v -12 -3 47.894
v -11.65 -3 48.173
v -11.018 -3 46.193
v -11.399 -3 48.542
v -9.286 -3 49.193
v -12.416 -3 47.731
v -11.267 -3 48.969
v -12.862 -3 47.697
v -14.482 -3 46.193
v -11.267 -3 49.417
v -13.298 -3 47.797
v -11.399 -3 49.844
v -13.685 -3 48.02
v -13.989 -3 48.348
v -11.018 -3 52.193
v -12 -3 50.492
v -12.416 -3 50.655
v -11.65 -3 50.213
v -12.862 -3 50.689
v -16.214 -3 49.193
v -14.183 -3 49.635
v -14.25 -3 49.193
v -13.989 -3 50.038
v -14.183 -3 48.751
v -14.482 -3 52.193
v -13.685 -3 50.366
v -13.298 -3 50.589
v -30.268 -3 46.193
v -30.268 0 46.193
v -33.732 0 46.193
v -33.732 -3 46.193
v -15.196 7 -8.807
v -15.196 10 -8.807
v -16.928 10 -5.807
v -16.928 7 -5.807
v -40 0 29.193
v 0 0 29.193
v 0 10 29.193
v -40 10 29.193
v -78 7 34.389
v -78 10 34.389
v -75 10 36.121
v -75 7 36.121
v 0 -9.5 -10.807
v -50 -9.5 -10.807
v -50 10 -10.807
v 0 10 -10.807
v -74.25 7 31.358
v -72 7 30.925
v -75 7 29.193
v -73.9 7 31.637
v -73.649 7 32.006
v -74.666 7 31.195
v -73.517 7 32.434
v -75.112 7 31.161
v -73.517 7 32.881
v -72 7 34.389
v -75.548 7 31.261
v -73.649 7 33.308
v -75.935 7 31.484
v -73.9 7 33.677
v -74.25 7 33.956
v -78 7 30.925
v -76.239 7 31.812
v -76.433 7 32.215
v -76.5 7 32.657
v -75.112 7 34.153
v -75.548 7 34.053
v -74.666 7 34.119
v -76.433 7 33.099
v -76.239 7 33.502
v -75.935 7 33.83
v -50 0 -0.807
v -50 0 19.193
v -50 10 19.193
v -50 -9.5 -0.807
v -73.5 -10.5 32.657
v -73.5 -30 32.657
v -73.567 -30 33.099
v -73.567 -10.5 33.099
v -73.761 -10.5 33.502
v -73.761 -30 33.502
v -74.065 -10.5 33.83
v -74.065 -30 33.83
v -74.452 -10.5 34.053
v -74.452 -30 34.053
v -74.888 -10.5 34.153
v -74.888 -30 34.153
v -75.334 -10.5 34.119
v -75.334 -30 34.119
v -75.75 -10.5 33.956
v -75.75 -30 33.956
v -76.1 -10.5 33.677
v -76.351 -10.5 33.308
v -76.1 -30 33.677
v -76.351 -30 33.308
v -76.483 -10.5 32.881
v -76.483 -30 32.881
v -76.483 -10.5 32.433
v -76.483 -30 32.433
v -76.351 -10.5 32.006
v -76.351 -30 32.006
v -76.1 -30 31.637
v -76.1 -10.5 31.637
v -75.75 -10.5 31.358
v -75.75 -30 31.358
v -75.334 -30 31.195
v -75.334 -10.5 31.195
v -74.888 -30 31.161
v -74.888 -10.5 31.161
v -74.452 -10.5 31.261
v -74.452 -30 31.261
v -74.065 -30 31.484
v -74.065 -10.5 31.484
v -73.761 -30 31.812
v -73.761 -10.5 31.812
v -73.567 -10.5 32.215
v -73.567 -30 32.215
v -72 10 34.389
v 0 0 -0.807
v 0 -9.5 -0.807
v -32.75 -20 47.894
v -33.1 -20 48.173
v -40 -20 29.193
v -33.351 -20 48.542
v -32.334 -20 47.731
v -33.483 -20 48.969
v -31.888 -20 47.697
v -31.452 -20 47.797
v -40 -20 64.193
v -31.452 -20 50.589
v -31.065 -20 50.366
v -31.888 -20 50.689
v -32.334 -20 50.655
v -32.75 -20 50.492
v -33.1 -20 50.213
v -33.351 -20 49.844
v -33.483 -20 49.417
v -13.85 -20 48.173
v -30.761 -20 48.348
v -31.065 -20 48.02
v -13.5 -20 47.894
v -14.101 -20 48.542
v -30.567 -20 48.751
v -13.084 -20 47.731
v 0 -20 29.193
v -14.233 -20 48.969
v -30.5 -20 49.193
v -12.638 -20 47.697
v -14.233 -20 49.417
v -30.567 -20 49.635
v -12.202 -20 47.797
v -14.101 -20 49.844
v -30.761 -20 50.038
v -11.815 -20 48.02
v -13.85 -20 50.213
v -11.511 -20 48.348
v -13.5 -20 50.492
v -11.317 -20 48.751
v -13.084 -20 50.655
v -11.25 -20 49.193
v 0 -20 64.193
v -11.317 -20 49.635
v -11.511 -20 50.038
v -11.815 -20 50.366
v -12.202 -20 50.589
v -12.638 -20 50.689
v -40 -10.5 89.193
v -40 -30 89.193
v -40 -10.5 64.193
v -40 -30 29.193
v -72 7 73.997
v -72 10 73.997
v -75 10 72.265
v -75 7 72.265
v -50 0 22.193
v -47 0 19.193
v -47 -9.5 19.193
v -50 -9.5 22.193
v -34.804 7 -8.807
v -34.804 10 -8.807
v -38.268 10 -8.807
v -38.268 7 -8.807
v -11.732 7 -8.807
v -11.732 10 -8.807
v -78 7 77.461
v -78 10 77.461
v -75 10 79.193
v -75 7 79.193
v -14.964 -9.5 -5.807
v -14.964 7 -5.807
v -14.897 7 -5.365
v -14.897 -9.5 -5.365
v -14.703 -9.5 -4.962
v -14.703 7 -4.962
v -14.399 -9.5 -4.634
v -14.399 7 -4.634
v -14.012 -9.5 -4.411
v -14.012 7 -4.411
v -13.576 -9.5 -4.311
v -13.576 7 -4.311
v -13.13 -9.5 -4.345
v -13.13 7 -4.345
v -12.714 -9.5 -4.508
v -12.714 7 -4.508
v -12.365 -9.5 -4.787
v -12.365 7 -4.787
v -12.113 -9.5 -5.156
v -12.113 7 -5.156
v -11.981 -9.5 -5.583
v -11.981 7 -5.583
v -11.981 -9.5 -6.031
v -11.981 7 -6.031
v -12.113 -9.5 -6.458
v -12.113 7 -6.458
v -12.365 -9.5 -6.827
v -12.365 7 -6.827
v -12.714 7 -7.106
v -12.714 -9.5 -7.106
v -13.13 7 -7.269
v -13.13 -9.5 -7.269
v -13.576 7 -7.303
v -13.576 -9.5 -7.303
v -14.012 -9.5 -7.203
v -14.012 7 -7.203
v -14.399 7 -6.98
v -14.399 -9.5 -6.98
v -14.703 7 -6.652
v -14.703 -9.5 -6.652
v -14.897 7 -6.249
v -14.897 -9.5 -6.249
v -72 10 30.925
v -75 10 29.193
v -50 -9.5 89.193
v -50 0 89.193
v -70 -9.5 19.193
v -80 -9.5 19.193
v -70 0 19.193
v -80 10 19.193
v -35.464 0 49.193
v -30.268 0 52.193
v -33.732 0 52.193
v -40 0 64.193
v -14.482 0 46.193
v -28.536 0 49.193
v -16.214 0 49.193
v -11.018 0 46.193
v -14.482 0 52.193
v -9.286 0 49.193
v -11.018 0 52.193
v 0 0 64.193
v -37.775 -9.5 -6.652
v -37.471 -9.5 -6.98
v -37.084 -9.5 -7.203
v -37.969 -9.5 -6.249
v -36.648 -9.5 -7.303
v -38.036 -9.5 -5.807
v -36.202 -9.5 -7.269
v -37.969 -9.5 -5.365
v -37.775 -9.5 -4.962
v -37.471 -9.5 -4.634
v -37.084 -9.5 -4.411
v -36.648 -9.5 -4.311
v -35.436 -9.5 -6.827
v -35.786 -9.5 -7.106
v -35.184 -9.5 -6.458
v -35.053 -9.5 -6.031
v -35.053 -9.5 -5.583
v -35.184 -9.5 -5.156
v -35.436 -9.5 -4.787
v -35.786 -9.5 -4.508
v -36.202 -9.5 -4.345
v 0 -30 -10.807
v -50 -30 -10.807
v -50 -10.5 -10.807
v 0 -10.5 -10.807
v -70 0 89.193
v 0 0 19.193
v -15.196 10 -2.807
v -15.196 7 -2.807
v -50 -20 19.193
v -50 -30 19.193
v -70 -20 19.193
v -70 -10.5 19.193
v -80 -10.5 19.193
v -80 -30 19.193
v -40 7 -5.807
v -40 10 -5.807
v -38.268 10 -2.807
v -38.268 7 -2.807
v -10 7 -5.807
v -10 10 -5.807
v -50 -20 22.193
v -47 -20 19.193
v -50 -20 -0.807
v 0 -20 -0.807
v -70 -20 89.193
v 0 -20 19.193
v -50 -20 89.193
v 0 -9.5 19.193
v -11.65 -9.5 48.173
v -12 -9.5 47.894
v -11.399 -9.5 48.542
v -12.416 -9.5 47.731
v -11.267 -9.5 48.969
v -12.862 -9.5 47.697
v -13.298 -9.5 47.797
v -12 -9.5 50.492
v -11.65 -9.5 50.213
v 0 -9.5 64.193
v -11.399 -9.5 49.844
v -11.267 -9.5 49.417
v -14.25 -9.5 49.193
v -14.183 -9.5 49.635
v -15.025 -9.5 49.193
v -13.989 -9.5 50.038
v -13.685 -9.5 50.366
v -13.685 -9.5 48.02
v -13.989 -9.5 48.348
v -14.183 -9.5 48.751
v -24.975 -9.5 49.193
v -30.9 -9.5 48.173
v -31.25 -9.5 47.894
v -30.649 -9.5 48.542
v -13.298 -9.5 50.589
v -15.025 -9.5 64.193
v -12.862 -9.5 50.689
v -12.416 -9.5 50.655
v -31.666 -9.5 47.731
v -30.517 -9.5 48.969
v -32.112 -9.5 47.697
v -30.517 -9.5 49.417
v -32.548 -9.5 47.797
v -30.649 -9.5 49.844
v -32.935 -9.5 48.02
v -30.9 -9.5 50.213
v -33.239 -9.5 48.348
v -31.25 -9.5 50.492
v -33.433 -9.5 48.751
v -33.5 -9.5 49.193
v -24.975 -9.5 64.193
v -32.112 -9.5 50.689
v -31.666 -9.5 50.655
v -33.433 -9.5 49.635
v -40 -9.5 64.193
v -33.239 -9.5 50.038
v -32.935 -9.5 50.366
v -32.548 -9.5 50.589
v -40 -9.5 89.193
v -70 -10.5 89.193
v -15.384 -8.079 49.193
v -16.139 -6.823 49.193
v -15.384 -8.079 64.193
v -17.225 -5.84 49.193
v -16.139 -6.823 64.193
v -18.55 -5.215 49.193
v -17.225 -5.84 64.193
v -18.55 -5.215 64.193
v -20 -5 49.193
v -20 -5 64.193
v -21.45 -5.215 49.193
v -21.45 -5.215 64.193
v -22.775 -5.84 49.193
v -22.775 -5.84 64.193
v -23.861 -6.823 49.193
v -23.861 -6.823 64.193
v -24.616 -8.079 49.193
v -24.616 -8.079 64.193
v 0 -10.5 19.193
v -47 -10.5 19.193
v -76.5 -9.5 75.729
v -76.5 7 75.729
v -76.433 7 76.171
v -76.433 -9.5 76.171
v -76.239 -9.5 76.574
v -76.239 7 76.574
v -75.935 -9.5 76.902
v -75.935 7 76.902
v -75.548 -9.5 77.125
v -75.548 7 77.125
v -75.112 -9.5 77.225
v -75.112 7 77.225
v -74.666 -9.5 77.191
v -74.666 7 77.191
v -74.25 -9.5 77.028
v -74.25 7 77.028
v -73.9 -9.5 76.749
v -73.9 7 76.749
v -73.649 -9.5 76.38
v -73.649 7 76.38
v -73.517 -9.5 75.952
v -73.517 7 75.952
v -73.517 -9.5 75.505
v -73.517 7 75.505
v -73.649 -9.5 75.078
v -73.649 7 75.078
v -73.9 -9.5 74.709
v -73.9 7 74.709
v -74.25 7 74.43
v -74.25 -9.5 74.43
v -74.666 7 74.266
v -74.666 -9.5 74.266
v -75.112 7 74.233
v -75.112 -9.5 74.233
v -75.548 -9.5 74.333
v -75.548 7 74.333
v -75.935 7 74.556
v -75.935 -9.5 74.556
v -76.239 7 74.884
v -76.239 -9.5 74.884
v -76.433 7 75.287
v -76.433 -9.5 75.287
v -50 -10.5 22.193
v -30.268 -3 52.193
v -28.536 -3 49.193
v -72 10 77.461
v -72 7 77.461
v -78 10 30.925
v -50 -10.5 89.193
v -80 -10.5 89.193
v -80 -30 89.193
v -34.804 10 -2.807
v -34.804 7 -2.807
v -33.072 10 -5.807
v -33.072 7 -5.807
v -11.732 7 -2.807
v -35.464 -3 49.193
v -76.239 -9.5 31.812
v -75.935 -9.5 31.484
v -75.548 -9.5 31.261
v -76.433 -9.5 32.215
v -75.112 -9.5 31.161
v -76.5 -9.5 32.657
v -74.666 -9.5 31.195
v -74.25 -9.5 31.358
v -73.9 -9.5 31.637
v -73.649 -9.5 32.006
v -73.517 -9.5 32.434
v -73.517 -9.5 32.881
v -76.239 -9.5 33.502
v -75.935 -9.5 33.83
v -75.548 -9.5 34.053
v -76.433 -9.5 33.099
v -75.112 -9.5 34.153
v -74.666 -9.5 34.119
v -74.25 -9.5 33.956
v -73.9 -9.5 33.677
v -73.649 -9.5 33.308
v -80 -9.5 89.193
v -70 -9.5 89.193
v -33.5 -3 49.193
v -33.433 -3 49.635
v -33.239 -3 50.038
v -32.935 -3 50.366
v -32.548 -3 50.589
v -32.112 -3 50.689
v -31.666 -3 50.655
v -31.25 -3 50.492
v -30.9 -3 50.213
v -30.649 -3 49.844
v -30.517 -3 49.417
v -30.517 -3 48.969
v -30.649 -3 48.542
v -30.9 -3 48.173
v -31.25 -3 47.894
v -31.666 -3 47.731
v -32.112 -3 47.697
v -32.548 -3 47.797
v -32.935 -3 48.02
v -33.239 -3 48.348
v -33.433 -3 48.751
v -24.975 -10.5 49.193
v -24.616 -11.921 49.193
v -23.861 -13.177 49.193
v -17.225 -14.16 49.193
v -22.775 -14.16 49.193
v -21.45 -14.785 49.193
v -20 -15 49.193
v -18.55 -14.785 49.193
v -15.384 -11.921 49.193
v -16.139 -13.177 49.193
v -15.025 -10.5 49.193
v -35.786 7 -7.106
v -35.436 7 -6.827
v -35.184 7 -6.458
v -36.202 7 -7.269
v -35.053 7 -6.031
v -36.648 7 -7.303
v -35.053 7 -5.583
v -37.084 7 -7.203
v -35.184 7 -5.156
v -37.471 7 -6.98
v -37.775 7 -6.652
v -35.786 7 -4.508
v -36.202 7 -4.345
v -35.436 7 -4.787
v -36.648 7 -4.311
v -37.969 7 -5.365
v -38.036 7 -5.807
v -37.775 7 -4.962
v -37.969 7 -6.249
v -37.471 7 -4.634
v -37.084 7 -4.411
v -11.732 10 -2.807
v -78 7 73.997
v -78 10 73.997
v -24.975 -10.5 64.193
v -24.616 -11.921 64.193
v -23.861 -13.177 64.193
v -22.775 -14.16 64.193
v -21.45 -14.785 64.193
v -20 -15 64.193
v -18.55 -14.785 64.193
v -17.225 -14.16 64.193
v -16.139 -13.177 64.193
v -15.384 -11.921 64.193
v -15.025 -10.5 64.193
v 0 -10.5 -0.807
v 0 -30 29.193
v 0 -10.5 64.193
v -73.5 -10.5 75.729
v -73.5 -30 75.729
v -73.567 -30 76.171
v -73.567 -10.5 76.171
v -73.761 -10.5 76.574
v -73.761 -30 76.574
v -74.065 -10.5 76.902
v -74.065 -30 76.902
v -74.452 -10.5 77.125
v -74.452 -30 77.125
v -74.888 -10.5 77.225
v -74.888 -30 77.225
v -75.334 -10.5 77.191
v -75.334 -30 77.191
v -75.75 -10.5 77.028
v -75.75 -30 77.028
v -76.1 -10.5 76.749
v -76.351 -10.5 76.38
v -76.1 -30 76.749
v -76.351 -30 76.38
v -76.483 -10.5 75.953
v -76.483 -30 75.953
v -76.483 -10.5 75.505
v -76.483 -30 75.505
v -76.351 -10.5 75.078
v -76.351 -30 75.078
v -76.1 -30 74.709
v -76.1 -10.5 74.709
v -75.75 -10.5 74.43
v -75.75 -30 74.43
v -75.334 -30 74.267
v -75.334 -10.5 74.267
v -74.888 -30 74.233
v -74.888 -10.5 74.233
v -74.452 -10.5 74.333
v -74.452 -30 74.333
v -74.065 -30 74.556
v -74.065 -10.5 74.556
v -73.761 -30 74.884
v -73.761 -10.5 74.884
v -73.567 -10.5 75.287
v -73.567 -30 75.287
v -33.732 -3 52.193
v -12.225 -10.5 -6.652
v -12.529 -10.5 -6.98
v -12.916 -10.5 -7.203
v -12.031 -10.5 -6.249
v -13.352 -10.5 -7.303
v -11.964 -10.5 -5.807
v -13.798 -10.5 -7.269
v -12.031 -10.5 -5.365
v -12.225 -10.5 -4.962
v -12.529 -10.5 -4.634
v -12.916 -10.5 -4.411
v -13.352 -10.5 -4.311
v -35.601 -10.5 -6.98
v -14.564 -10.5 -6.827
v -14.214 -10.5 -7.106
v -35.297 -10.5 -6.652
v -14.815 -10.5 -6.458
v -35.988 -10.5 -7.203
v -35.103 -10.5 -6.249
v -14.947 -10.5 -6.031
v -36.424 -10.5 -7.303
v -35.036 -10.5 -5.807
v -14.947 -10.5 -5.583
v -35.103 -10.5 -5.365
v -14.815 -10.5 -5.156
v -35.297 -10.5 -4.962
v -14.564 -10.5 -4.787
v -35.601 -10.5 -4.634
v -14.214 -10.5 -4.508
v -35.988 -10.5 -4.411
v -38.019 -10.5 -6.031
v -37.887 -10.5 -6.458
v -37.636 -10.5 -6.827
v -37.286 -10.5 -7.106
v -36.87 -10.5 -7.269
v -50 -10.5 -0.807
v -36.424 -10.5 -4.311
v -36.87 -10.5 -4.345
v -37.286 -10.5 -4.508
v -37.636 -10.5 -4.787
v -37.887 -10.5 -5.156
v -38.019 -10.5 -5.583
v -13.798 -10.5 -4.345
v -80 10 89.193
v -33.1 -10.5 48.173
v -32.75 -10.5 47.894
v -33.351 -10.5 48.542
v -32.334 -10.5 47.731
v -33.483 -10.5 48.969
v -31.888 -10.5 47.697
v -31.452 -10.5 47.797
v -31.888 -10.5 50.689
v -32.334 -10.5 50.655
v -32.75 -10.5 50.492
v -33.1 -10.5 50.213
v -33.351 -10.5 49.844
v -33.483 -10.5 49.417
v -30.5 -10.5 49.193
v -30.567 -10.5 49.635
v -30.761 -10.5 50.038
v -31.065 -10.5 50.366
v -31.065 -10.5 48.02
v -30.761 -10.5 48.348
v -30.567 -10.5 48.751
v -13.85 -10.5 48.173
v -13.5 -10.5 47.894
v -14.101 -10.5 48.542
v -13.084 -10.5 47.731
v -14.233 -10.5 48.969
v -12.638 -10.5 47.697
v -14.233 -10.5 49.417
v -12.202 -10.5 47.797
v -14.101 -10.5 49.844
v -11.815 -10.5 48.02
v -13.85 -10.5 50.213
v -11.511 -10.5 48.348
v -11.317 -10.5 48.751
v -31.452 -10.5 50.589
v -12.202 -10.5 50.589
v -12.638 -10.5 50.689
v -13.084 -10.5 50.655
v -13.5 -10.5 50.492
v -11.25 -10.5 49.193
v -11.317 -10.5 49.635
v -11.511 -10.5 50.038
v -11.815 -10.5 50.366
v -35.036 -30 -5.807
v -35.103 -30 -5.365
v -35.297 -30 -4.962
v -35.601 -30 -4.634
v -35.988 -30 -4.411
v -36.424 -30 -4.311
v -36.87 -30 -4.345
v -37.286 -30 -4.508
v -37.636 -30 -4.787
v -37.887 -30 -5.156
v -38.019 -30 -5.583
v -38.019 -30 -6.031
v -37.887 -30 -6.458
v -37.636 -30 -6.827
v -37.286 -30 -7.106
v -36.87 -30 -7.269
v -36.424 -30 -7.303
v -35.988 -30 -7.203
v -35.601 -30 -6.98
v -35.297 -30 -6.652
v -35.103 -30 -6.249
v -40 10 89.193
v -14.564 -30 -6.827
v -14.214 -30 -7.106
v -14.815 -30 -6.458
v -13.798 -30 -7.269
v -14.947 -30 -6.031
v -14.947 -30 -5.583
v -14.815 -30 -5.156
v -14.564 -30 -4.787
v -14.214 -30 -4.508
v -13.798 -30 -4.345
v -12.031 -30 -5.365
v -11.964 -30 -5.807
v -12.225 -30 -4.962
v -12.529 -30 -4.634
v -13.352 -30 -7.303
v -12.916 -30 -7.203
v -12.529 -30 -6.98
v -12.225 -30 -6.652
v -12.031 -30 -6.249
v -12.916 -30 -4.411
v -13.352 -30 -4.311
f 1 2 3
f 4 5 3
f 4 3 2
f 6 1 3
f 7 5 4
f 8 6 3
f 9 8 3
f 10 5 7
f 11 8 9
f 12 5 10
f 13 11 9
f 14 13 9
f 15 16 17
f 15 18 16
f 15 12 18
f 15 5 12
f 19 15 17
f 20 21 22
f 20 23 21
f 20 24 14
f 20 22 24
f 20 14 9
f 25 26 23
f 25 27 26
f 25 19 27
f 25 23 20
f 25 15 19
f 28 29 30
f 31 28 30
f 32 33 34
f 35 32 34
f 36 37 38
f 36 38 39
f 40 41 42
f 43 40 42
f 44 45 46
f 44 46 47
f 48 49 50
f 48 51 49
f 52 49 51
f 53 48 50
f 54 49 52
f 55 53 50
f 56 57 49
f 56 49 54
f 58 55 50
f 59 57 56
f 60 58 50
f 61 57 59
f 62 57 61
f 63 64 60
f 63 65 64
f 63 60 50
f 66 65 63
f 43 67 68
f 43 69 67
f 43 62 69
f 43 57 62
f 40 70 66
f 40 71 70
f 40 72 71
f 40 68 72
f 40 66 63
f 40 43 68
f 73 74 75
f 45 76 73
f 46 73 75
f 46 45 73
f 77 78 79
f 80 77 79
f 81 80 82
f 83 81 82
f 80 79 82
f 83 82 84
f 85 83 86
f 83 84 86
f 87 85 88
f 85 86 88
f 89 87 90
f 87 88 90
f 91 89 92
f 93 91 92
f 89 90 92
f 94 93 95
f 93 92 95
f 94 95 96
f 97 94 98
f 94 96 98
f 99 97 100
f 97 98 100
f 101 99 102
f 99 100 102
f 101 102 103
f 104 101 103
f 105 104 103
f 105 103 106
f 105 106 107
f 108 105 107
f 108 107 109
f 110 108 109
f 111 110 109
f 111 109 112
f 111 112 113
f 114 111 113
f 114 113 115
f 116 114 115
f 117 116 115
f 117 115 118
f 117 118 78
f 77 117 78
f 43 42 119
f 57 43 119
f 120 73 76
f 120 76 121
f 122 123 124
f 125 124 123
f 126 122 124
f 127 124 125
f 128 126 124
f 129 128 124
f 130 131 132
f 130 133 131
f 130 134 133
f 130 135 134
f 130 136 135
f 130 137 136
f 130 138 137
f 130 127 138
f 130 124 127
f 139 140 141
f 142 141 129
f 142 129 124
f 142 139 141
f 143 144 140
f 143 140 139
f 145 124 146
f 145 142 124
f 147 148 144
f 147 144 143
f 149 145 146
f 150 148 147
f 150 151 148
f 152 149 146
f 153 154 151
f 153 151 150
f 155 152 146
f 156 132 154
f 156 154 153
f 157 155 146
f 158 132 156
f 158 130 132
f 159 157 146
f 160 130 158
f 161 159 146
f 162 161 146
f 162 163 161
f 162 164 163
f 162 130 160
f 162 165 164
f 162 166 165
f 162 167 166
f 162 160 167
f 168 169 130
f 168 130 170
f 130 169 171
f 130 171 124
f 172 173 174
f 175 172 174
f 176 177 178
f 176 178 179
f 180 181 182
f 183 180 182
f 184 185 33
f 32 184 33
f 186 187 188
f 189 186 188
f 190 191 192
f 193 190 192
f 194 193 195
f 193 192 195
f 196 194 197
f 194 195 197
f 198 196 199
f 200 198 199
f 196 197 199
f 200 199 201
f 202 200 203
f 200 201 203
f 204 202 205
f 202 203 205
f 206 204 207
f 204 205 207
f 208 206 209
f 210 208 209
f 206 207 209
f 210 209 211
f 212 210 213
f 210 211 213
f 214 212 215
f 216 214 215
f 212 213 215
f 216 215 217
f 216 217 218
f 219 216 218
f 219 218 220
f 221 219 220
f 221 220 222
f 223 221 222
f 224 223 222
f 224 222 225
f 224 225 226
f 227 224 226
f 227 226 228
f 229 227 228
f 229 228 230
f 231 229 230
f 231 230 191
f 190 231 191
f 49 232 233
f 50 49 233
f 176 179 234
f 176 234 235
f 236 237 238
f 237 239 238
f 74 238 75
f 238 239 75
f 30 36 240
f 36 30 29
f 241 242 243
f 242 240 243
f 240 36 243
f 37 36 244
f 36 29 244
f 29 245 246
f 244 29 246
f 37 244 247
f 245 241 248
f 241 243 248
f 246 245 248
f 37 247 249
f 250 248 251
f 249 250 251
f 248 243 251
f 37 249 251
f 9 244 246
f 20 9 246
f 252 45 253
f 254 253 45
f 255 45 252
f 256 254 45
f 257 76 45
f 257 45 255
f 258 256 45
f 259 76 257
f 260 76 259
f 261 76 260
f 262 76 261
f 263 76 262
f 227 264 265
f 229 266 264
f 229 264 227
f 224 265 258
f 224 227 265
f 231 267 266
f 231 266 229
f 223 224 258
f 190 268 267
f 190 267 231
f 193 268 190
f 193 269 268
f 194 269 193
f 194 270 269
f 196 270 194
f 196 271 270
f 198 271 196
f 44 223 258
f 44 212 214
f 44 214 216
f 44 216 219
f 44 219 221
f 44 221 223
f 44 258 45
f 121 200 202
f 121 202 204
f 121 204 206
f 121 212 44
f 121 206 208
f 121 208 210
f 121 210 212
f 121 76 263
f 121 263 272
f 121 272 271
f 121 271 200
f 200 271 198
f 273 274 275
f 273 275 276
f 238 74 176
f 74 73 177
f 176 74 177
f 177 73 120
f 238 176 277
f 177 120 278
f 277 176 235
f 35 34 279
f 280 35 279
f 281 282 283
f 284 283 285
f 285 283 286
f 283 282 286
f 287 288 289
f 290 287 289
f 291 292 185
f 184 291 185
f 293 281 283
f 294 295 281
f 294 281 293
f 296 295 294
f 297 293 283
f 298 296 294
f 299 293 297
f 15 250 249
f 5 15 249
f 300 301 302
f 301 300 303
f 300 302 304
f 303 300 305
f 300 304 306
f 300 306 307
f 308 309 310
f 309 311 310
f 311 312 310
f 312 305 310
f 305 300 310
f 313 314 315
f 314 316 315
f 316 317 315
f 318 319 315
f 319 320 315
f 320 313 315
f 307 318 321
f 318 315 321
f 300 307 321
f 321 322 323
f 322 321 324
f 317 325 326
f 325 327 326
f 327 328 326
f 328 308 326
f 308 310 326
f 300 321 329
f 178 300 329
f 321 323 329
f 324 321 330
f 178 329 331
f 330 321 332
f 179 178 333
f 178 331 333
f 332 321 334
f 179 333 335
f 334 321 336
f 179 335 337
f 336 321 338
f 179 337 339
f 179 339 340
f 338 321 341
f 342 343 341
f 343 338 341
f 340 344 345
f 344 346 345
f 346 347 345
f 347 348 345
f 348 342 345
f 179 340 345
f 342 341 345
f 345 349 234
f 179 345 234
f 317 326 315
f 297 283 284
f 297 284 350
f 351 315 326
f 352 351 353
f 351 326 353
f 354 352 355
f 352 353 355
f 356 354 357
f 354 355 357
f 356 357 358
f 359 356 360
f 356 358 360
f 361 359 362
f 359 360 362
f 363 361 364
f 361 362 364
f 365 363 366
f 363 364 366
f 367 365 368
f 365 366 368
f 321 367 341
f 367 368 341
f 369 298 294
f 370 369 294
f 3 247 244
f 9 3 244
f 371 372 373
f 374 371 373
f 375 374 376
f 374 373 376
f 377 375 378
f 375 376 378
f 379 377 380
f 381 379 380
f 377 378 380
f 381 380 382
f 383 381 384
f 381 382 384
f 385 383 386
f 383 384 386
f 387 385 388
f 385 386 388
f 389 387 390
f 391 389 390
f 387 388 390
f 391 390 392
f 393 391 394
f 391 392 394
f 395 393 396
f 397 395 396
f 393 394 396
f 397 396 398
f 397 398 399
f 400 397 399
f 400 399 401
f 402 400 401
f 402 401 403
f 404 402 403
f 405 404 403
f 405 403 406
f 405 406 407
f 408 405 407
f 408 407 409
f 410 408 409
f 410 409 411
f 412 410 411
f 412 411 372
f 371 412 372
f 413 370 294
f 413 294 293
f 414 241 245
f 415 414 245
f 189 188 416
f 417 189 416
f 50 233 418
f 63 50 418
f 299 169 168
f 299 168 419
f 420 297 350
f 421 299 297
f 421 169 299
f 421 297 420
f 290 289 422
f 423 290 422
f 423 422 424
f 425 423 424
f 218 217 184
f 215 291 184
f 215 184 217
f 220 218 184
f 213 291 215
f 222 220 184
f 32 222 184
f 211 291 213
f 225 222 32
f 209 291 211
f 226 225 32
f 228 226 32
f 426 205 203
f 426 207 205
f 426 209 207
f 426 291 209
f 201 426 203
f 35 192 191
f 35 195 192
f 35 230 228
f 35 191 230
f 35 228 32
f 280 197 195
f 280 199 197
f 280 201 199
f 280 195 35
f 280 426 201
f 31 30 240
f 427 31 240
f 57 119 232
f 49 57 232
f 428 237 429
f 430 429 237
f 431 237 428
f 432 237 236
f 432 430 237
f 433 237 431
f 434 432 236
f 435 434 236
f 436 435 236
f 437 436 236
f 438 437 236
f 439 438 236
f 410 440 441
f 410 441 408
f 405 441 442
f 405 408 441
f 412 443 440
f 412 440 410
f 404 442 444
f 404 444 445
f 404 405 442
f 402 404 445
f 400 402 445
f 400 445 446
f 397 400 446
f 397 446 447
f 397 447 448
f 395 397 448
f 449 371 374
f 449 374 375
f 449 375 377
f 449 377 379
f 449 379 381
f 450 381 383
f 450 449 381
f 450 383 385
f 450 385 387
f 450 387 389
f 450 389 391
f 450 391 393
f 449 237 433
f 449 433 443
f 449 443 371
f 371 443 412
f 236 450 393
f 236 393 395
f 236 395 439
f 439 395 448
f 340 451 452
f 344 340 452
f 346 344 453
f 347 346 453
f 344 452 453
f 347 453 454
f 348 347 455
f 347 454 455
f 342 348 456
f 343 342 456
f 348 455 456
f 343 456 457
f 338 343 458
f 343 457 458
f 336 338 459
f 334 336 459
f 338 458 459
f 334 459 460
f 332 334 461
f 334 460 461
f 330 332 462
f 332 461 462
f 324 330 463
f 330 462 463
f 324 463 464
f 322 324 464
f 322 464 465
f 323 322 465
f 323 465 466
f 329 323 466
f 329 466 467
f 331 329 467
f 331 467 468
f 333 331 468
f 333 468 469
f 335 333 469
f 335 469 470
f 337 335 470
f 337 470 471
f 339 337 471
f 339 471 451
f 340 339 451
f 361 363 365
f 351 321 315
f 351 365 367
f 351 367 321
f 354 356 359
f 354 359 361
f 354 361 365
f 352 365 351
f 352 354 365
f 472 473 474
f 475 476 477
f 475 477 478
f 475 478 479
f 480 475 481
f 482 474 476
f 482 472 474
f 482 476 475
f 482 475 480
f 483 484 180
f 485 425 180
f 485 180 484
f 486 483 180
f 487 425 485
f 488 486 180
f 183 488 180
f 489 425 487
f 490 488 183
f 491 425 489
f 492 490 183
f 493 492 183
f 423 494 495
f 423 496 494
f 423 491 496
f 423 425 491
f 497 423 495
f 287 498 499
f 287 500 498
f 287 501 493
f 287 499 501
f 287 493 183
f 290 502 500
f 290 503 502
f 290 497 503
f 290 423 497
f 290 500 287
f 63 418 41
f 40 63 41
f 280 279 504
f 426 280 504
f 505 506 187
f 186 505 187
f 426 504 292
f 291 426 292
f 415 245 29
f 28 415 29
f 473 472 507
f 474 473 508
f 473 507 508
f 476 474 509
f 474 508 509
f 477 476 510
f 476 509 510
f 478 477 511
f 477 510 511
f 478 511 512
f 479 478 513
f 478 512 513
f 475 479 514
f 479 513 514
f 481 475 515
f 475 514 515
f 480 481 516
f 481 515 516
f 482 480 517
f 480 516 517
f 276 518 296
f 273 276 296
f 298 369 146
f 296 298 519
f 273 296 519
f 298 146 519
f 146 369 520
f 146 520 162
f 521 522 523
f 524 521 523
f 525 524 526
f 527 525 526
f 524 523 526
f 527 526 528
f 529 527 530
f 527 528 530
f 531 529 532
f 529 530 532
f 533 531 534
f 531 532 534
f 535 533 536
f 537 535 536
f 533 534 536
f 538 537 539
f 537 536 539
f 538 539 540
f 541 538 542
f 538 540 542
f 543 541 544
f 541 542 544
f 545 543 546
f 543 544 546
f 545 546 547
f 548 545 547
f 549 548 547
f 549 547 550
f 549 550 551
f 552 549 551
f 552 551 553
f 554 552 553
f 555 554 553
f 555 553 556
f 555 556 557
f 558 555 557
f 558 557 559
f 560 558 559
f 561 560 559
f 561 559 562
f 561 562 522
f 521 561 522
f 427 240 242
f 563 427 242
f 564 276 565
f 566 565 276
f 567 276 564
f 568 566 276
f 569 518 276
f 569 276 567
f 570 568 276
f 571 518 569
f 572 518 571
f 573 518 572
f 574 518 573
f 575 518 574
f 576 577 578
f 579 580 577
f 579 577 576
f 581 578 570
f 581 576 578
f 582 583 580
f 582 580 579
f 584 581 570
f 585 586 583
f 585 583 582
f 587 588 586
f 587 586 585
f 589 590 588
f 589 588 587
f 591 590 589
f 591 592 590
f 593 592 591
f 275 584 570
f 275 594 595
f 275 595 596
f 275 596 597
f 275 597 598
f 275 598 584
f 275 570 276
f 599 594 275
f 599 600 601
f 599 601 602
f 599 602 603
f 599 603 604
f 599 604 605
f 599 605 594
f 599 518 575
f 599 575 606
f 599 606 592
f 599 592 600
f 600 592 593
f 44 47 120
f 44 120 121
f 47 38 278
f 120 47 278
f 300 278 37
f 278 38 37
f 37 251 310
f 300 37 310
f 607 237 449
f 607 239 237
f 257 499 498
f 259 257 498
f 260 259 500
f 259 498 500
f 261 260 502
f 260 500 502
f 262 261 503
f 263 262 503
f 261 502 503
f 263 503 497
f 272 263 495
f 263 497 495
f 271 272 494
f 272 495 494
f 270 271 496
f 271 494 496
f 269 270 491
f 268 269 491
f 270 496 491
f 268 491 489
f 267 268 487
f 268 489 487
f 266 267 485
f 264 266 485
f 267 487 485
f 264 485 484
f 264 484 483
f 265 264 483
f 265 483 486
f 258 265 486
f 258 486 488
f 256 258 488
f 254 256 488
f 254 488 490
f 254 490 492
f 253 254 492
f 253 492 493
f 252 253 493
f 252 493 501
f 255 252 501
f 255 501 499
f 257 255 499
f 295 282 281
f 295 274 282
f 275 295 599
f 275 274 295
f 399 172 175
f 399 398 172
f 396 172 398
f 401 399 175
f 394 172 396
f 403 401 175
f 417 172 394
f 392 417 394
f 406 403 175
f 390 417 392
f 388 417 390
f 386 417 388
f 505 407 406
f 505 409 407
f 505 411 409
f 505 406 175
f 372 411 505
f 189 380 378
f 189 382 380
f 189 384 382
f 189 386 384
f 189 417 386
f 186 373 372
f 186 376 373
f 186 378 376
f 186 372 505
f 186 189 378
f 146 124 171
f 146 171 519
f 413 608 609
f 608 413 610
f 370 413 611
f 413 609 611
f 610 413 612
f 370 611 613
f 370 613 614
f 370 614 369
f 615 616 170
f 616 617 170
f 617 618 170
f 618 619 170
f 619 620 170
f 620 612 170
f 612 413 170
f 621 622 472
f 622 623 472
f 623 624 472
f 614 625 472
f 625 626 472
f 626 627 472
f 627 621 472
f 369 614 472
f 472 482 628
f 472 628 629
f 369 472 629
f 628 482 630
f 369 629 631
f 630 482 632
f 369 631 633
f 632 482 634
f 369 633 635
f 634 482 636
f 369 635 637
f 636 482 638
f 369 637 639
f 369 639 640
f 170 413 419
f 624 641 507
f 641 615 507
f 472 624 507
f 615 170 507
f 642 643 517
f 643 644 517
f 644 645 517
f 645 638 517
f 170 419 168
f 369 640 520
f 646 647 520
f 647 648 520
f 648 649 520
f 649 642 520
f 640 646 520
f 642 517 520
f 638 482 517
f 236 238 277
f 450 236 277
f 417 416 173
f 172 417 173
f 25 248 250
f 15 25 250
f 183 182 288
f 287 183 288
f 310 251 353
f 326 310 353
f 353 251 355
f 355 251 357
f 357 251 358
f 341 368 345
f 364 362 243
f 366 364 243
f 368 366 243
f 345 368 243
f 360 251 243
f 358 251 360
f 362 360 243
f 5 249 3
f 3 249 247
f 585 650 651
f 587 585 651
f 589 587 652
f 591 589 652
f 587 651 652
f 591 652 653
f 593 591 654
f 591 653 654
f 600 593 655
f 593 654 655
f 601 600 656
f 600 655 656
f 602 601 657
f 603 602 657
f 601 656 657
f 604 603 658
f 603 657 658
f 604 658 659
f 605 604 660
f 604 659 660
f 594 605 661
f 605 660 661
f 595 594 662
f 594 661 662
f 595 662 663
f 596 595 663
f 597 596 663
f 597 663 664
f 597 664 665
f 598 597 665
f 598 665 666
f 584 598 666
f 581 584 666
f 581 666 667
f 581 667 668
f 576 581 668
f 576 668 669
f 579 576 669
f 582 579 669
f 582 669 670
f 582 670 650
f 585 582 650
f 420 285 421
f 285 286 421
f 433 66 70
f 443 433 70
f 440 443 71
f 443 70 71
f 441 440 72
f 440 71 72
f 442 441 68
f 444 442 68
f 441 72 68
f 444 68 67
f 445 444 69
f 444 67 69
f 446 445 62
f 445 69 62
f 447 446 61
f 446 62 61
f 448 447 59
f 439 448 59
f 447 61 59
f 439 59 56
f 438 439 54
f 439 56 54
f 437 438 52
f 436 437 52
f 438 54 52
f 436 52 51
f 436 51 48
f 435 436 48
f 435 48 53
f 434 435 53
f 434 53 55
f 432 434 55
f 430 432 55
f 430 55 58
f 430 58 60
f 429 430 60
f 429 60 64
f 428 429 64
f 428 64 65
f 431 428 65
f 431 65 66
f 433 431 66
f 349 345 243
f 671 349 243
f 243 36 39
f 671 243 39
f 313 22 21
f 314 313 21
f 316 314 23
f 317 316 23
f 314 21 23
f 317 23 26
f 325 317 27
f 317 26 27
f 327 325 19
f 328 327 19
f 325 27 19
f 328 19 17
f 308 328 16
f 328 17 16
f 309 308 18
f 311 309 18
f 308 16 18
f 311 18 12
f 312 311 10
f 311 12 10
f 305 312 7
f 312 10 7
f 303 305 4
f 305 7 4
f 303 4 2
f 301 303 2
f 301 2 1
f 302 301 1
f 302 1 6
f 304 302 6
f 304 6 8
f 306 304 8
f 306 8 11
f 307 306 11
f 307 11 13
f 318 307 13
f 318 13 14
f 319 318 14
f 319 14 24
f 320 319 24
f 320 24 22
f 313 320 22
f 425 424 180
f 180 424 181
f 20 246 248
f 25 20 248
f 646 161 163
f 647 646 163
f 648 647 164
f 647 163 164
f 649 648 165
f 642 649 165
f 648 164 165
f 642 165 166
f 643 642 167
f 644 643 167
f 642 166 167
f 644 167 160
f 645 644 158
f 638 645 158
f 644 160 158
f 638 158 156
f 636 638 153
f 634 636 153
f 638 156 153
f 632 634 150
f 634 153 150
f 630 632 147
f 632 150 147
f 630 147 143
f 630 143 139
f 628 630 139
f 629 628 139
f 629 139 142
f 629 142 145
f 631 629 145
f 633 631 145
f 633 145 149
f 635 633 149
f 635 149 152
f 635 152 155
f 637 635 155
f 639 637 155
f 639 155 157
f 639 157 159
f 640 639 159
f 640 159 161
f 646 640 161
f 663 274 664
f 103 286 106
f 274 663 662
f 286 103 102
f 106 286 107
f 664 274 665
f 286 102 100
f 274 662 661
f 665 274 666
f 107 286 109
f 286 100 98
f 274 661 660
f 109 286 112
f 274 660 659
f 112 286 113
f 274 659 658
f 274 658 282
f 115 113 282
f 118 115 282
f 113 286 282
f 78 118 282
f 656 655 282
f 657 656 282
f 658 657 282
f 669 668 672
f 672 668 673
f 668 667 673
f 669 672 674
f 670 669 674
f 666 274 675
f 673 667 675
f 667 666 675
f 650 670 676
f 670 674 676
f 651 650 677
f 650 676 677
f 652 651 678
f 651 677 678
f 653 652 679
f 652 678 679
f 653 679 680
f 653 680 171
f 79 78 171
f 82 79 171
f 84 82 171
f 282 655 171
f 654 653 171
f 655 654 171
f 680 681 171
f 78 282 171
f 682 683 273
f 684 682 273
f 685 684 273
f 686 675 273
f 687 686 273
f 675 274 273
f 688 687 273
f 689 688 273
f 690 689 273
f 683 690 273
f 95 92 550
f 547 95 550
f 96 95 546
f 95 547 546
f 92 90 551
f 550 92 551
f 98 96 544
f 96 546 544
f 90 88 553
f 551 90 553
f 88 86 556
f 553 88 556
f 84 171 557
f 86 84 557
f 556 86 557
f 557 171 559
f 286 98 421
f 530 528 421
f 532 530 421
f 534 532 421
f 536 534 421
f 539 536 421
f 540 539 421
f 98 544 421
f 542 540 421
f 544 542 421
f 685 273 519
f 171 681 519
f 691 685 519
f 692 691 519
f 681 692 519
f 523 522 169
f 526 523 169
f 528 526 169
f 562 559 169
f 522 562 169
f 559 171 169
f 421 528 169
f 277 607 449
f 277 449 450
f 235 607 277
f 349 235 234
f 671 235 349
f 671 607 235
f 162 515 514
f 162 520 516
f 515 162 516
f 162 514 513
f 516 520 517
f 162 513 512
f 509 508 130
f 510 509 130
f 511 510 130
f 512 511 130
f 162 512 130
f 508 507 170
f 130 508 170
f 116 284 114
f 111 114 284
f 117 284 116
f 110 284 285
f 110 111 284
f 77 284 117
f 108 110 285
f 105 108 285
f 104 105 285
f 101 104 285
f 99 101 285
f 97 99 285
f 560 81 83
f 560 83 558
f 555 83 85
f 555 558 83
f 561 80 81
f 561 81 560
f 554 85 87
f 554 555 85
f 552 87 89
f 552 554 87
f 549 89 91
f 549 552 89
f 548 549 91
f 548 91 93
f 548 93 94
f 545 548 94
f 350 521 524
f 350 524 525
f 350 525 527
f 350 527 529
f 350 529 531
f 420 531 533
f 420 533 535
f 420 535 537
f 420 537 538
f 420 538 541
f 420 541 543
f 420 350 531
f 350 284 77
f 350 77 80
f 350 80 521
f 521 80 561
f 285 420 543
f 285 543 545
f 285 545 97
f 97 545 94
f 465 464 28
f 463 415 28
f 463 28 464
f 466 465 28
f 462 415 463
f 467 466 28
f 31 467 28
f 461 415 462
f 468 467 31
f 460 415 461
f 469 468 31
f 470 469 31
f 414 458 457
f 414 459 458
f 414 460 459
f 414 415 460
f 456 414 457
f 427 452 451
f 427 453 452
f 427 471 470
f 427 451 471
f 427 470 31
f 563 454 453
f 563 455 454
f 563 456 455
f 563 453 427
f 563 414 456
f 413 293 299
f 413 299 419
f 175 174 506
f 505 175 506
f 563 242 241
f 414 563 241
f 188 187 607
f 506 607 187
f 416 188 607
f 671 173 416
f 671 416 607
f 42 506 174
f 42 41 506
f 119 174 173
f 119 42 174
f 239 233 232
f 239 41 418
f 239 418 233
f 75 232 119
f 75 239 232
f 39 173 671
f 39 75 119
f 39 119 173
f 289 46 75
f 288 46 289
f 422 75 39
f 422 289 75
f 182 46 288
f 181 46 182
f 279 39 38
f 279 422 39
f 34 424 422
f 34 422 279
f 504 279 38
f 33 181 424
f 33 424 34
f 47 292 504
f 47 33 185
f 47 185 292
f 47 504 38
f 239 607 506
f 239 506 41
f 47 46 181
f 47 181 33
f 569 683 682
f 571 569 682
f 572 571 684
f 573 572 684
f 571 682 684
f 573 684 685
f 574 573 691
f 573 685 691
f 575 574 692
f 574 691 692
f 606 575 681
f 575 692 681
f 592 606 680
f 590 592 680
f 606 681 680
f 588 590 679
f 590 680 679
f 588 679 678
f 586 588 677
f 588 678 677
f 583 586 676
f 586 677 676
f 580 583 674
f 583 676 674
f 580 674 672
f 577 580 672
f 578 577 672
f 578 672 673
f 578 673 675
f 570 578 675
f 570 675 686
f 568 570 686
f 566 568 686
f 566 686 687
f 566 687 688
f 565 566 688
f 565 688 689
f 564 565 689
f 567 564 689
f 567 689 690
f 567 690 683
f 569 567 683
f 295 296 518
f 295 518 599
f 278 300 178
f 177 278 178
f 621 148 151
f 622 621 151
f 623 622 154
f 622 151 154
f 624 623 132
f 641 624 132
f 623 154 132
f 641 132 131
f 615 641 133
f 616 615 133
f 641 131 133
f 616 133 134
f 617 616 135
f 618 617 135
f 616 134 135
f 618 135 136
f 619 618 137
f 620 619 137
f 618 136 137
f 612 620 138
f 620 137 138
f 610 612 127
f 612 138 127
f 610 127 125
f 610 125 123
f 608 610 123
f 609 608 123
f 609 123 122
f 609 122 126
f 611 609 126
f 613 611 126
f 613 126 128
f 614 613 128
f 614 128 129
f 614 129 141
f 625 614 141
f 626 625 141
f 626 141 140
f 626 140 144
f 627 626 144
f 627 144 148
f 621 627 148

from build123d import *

# Parameters (mm, degrees)
F1_DEPTH        = 20
F2_W            = 50
F2_H            = 10
F3_DEPTH        = 10
F4_W            = 50
F4_H            = 10
F5_DEPTH        = 10
F6_W            = 50
F6_H            = 10
F7_DEPTH        = 30
F8_W            = 10
F8_H            = 10
F9_DEPTH        = 60
F10_W           = 10
F10_H           = 70
F11_DEPTH       = 30
F12_R           = 5
F13_DEPTH       = 15
F16_DEPTH       = 70
F17_T1_DEPTH    = 17.2150489639
F17_S1_T1_DEPTH = 10.5
F18_W           = 10
F18_H           = 70
F18_W_2         = 50
F18_H_2         = 10
F20_DEPTH       = 9.5
F19_W           = 10
F19_H           = 70
F19_W_2         = 50
F19_H_2         = 10
F21_DEPTH       = 9.5
F22_R           = 1.5
F23_DEPTH       = 20
F24_R           = 1.5
F25_DEPTH       = 20
F26_DEPTH       = 3
F28_R           = 1.5
F29_DEPTH       = 10
F27_R           = 1.5
F30_DEPTH       = 10
F31_DEPTH       = 3


# Not quite as in the source:
# - a fillet or chamfer that OpenCascade refuses, or shapes differently, is made with other operations: its cross-section is extruded or revolved along the edge and cut away or added


with BuildPart() as f1:
    # F0 (on Front) → F1 (new body)
    with BuildSketch(Plane.XZ):
        Polygon((-40, 89.1929870069), (-50, 89.1929870069), (-50, 19.1929870069), (0, 19.1929870069), (0, 64.1929870069), (-40, 64.1929870069), align=None)
    extrude(amount=F1_DEPTH)

    # F2 (on face) → F3 (join)
    with BuildSketch(Plane.XZ.offset(20)):
        with Locations((-25, 24.1929870069)):
            Rectangle(F2_W, F2_H)
    extrude(amount=F3_DEPTH)

    # F4 (on face) → F5 (join)
    with BuildSketch(Plane(origin=(0, 0, 0), x_dir=(-1, 0, 0), z_dir=(0, 1, 0))):
        with Locations((25, 24.1929870069)):
            Rectangle(F4_W, F4_H)
    extrude(amount=F5_DEPTH)

    # F6 (on face) → F7 (join)
    with BuildSketch(Plane(origin=(0, 0, 19.1929870069), x_dir=(1, 0, 0), z_dir=(0, 0, -1))):
        with Locations((-25, 25)):
            Rectangle(F6_W, F6_H)
        with Locations((-25, -5)):
            Rectangle(F6_W, F6_H)
    extrude(amount=F7_DEPTH)

    # F8 (on face) → F9 (join)
    with BuildSketch(Plane.XY.offset(29.1929870069)):
        with Locations((-45, 5)):
            Rectangle(F8_W, F8_H)
        with Locations((-45, -25)):
            Rectangle(F8_W, F8_H)
    extrude(amount=F9_DEPTH)

    # F10 (on face) → F11 (join)
    with BuildSketch(Plane(origin=(-50, 0, 0), x_dir=(0, -1, 0), z_dir=(-1, 0, 0))):
        with Locations((25, 54.1929870069)):
            Rectangle(F10_W, F10_H)
        with Locations((-5, 54.1929870069)):
            Rectangle(F10_W, F10_H)
    extrude(amount=F11_DEPTH)

    # F12 (on face) → F13 (cut)
    with BuildSketch(Plane.XY.offset(64.1929870069)):
        with Locations((-20, -10)):
            Circle(F12_R)
    extrude(amount=-F13_DEPTH, mode=Mode.SUBTRACT)

    # F15 (on face) + F14 (on face) → F16 (cut)
    with BuildSketch(Plane.XY.offset(64.1929870069)):
        with BuildLine():
            Line((0, -10.5), (0, -9.5))
            Line((0, -9.5), (-15.0250628145, -9.5))
            ThreePointArc((-15.0250628145, -9.5), (-15.0062696344, -9.7496861247), (-15, -10))
            ThreePointArc((-15, -10), (-15.0062696344, -10.2503138753), (-15.0250628145, -10.5))
            Line((-15.0250628145, -10.5), (0, -10.5))
        make_face()
        with BuildLine():
            Line((-15.0250628145, -9.5), (-24.9749371855, -9.5))
            ThreePointArc((-24.9749371855, -9.5), (-25, -10), (-24.9749371855, -10.5))
            Line((-24.9749371855, -10.5), (-15.0250628145, -10.5))
            ThreePointArc((-15.0250628145, -10.5), (-15.0062696344, -10.2503138753), (-15, -10))
            ThreePointArc((-15, -10), (-15.0062696344, -9.7496861247), (-15.0250628145, -9.5))
        make_face()
        with BuildLine():
            Line((-24.9749371855, -9.5), (-40, -9.5))
            Line((-40, -9.5), (-40, -10.5))
            Line((-40, -10.5), (-24.9749371855, -10.5))
            ThreePointArc((-24.9749371855, -10.5), (-25, -10), (-24.9749371855, -9.5))
        make_face()
    with BuildSketch(Plane.XY.offset(89.1929870069)):
        Polygon((-40, -10.5), (-40, -10), (-40, -9.5), (-50, -9.5), (-50, -10.5), align=None)
    extrude(amount=-F16_DEPTH, mode=Mode.SUBTRACT)

    # F17: chamfer of 3 on 1 edges, made by hand

    # F17_s2 → F17_t1 (cut)
    with BuildSketch(Plane.XZ.offset(2.7849510361)):
        Polygon((-47, 19.1929870069), (-50, 22.1929870069), (-50, 19.1929870069), align=None)
    extrude(amount=F17_T1_DEPTH, mode=Mode.SUBTRACT)

    # F17#s1: chamfer of 3 on 1 edges, made by hand

    # F17_s1_s2 → F17_s1_t1 (cut)
    with BuildSketch(Plane.XZ):
        Polygon((-50, 22.1929870069), (-47, 19.1929870069), (-50, 19.1929870069), align=None)
    extrude(amount=F17_S1_T1_DEPTH, mode=Mode.SUBTRACT)

    # F18 (on face) → F20 (join)
    with BuildSketch(Plane.XZ):
        with Locations((-75, 54.1929870069)):
            Rectangle(F18_W, F18_H)
        with Locations((-25, -5.8070129931)):
            Rectangle(F18_W_2, F18_H_2)
    extrude(amount=F20_DEPTH)

    # F19 (on face) → F21 (join)
    with BuildSketch(Plane(origin=(0, -20, 0), x_dir=(-1, 0, 0), z_dir=(0, 1, 0))):
        with Locations((75, 54.1929870069)):
            Rectangle(F19_W, F19_H)
        with Locations((25, -5.8070129931)):
            Rectangle(F19_W_2, F19_H_2)
    extrude(amount=F21_DEPTH)

    # F22 (on face) → F23 (cut)
    with BuildSketch(Plane.XZ.offset(30)):
        with Locations((-13.464, -5.8070129931)):
            Circle(F22_R)
        with Locations((-75, 75.7289870069)):
            Circle(F22_R)
        with Locations((-75, 32.6569870069)):
            Circle(F22_R)
        with Locations((-36.536, -5.8070129931)):
            Circle(F22_R)
    extrude(amount=-F23_DEPTH, mode=Mode.SUBTRACT)

    # F24 (on face) → F25 (cut)
    with BuildSketch(Plane(origin=(0, 10, 0), x_dir=(-1, 0, 0), z_dir=(0, 1, 0))):
        with Locations((13.4641016151, -5.8070129931)):
            Circle(F24_R)
        with Locations((36.5358983849, -5.8070129931)):
            Circle(F24_R)
        with Locations((75, 32.657088622)):
            Circle(F24_R)
        with Locations((75, 75.7288853918)):
            Circle(F24_R)
    extrude(amount=-F25_DEPTH, mode=Mode.SUBTRACT)

    # F24 (on face) → F26 (cut)
    with BuildSketch(Plane(origin=(0, 10, 0), x_dir=(-1, 0, 0), z_dir=(0, 1, 0))):
        Polygon((34.8038475773, -2.8070129931), (33.0717967697, -5.8070129931), (34.8038475773, -8.8070129931), (38.2679491924, -8.8070129931), (40, -5.8070129931), (38.2679491924, -2.8070129931), align=None)
        with Locations((36.5358983849, -5.8070129931)):
            Circle(F24_R, mode=Mode.SUBTRACT)
        Polygon((11.7320508076, -2.8070129931), (10, -5.8070129931), (11.7320508076, -8.8070129931), (15.1961524227, -8.8070129931), (16.9282032303, -5.8070129931), (15.1961524227, -2.8070129931), align=None)
        with Locations((13.4641016151, -5.8070129931)):
            Circle(F24_R, mode=Mode.SUBTRACT)
        Polygon((72, 30.9250378145), (75, 29.1929870069), (78, 30.9250378145), (78, 34.3891394296), (75, 36.1211902372), (72, 34.3891394296), align=None)
        with Locations((75, 32.657088622)):
            Circle(F24_R, mode=Mode.SUBTRACT)
        Polygon((72, 73.9968345842), (75, 72.2647837766), (78, 73.9968345842), (78, 77.4609361993), (75, 79.1929870069), (72, 77.4609361993), align=None)
        with Locations((75, 75.7288853918)):
            Circle(F24_R, mode=Mode.SUBTRACT)
    extrude(amount=-F26_DEPTH, mode=Mode.SUBTRACT)

    # F28 (on face) → F29 (cut)
    with BuildSketch(Plane(origin=(0, 0, 0), x_dir=(-1, 0, 0), z_dir=(0, 1, 0))):
        with Locations((32, 49.1929870069)):
            Circle(F28_R)
        with Locations((12.75, 49.1929870069)):
            Circle(F28_R)
    extrude(amount=-F29_DEPTH, mode=Mode.SUBTRACT)

    # F27 (on face) → F30 (cut)
    with BuildSketch(Plane.XZ.offset(20)):
        with Locations((-32, 49.1929870069)):
            Circle(F27_R)
        with Locations((-12.75, 49.1929870069)):
            Circle(F27_R)
    extrude(amount=-F30_DEPTH, mode=Mode.SUBTRACT)

    # F28 (on face) → F31 (cut)
    with BuildSketch(Plane(origin=(0, 0, 0), x_dir=(-1, 0, 0), z_dir=(0, 1, 0))):
        Polygon((30.2679491924, 52.1929870069), (28.5358983849, 49.1929870069), (30.2679491924, 46.1929870069), (33.7320508076, 46.1929870069), (35.4641016151, 49.1929870069), (33.7320508076, 52.1929870069), align=None)
        with Locations((32, 49.1929870069)):
            Circle(F28_R, mode=Mode.SUBTRACT)
        Polygon((11.0179491924, 52.1929870069), (9.2858983849, 49.1929870069), (11.0179491924, 46.1929870069), (14.4820508076, 46.1929870069), (16.2141016151, 49.1929870069), (14.4820508076, 52.1929870069), align=None)
        with Locations((12.75, 49.1929870069)):
            Circle(F28_R, mode=Mode.SUBTRACT)
    extrude(amount=-F31_DEPTH, mode=Mode.SUBTRACT)


solid = f1.part
